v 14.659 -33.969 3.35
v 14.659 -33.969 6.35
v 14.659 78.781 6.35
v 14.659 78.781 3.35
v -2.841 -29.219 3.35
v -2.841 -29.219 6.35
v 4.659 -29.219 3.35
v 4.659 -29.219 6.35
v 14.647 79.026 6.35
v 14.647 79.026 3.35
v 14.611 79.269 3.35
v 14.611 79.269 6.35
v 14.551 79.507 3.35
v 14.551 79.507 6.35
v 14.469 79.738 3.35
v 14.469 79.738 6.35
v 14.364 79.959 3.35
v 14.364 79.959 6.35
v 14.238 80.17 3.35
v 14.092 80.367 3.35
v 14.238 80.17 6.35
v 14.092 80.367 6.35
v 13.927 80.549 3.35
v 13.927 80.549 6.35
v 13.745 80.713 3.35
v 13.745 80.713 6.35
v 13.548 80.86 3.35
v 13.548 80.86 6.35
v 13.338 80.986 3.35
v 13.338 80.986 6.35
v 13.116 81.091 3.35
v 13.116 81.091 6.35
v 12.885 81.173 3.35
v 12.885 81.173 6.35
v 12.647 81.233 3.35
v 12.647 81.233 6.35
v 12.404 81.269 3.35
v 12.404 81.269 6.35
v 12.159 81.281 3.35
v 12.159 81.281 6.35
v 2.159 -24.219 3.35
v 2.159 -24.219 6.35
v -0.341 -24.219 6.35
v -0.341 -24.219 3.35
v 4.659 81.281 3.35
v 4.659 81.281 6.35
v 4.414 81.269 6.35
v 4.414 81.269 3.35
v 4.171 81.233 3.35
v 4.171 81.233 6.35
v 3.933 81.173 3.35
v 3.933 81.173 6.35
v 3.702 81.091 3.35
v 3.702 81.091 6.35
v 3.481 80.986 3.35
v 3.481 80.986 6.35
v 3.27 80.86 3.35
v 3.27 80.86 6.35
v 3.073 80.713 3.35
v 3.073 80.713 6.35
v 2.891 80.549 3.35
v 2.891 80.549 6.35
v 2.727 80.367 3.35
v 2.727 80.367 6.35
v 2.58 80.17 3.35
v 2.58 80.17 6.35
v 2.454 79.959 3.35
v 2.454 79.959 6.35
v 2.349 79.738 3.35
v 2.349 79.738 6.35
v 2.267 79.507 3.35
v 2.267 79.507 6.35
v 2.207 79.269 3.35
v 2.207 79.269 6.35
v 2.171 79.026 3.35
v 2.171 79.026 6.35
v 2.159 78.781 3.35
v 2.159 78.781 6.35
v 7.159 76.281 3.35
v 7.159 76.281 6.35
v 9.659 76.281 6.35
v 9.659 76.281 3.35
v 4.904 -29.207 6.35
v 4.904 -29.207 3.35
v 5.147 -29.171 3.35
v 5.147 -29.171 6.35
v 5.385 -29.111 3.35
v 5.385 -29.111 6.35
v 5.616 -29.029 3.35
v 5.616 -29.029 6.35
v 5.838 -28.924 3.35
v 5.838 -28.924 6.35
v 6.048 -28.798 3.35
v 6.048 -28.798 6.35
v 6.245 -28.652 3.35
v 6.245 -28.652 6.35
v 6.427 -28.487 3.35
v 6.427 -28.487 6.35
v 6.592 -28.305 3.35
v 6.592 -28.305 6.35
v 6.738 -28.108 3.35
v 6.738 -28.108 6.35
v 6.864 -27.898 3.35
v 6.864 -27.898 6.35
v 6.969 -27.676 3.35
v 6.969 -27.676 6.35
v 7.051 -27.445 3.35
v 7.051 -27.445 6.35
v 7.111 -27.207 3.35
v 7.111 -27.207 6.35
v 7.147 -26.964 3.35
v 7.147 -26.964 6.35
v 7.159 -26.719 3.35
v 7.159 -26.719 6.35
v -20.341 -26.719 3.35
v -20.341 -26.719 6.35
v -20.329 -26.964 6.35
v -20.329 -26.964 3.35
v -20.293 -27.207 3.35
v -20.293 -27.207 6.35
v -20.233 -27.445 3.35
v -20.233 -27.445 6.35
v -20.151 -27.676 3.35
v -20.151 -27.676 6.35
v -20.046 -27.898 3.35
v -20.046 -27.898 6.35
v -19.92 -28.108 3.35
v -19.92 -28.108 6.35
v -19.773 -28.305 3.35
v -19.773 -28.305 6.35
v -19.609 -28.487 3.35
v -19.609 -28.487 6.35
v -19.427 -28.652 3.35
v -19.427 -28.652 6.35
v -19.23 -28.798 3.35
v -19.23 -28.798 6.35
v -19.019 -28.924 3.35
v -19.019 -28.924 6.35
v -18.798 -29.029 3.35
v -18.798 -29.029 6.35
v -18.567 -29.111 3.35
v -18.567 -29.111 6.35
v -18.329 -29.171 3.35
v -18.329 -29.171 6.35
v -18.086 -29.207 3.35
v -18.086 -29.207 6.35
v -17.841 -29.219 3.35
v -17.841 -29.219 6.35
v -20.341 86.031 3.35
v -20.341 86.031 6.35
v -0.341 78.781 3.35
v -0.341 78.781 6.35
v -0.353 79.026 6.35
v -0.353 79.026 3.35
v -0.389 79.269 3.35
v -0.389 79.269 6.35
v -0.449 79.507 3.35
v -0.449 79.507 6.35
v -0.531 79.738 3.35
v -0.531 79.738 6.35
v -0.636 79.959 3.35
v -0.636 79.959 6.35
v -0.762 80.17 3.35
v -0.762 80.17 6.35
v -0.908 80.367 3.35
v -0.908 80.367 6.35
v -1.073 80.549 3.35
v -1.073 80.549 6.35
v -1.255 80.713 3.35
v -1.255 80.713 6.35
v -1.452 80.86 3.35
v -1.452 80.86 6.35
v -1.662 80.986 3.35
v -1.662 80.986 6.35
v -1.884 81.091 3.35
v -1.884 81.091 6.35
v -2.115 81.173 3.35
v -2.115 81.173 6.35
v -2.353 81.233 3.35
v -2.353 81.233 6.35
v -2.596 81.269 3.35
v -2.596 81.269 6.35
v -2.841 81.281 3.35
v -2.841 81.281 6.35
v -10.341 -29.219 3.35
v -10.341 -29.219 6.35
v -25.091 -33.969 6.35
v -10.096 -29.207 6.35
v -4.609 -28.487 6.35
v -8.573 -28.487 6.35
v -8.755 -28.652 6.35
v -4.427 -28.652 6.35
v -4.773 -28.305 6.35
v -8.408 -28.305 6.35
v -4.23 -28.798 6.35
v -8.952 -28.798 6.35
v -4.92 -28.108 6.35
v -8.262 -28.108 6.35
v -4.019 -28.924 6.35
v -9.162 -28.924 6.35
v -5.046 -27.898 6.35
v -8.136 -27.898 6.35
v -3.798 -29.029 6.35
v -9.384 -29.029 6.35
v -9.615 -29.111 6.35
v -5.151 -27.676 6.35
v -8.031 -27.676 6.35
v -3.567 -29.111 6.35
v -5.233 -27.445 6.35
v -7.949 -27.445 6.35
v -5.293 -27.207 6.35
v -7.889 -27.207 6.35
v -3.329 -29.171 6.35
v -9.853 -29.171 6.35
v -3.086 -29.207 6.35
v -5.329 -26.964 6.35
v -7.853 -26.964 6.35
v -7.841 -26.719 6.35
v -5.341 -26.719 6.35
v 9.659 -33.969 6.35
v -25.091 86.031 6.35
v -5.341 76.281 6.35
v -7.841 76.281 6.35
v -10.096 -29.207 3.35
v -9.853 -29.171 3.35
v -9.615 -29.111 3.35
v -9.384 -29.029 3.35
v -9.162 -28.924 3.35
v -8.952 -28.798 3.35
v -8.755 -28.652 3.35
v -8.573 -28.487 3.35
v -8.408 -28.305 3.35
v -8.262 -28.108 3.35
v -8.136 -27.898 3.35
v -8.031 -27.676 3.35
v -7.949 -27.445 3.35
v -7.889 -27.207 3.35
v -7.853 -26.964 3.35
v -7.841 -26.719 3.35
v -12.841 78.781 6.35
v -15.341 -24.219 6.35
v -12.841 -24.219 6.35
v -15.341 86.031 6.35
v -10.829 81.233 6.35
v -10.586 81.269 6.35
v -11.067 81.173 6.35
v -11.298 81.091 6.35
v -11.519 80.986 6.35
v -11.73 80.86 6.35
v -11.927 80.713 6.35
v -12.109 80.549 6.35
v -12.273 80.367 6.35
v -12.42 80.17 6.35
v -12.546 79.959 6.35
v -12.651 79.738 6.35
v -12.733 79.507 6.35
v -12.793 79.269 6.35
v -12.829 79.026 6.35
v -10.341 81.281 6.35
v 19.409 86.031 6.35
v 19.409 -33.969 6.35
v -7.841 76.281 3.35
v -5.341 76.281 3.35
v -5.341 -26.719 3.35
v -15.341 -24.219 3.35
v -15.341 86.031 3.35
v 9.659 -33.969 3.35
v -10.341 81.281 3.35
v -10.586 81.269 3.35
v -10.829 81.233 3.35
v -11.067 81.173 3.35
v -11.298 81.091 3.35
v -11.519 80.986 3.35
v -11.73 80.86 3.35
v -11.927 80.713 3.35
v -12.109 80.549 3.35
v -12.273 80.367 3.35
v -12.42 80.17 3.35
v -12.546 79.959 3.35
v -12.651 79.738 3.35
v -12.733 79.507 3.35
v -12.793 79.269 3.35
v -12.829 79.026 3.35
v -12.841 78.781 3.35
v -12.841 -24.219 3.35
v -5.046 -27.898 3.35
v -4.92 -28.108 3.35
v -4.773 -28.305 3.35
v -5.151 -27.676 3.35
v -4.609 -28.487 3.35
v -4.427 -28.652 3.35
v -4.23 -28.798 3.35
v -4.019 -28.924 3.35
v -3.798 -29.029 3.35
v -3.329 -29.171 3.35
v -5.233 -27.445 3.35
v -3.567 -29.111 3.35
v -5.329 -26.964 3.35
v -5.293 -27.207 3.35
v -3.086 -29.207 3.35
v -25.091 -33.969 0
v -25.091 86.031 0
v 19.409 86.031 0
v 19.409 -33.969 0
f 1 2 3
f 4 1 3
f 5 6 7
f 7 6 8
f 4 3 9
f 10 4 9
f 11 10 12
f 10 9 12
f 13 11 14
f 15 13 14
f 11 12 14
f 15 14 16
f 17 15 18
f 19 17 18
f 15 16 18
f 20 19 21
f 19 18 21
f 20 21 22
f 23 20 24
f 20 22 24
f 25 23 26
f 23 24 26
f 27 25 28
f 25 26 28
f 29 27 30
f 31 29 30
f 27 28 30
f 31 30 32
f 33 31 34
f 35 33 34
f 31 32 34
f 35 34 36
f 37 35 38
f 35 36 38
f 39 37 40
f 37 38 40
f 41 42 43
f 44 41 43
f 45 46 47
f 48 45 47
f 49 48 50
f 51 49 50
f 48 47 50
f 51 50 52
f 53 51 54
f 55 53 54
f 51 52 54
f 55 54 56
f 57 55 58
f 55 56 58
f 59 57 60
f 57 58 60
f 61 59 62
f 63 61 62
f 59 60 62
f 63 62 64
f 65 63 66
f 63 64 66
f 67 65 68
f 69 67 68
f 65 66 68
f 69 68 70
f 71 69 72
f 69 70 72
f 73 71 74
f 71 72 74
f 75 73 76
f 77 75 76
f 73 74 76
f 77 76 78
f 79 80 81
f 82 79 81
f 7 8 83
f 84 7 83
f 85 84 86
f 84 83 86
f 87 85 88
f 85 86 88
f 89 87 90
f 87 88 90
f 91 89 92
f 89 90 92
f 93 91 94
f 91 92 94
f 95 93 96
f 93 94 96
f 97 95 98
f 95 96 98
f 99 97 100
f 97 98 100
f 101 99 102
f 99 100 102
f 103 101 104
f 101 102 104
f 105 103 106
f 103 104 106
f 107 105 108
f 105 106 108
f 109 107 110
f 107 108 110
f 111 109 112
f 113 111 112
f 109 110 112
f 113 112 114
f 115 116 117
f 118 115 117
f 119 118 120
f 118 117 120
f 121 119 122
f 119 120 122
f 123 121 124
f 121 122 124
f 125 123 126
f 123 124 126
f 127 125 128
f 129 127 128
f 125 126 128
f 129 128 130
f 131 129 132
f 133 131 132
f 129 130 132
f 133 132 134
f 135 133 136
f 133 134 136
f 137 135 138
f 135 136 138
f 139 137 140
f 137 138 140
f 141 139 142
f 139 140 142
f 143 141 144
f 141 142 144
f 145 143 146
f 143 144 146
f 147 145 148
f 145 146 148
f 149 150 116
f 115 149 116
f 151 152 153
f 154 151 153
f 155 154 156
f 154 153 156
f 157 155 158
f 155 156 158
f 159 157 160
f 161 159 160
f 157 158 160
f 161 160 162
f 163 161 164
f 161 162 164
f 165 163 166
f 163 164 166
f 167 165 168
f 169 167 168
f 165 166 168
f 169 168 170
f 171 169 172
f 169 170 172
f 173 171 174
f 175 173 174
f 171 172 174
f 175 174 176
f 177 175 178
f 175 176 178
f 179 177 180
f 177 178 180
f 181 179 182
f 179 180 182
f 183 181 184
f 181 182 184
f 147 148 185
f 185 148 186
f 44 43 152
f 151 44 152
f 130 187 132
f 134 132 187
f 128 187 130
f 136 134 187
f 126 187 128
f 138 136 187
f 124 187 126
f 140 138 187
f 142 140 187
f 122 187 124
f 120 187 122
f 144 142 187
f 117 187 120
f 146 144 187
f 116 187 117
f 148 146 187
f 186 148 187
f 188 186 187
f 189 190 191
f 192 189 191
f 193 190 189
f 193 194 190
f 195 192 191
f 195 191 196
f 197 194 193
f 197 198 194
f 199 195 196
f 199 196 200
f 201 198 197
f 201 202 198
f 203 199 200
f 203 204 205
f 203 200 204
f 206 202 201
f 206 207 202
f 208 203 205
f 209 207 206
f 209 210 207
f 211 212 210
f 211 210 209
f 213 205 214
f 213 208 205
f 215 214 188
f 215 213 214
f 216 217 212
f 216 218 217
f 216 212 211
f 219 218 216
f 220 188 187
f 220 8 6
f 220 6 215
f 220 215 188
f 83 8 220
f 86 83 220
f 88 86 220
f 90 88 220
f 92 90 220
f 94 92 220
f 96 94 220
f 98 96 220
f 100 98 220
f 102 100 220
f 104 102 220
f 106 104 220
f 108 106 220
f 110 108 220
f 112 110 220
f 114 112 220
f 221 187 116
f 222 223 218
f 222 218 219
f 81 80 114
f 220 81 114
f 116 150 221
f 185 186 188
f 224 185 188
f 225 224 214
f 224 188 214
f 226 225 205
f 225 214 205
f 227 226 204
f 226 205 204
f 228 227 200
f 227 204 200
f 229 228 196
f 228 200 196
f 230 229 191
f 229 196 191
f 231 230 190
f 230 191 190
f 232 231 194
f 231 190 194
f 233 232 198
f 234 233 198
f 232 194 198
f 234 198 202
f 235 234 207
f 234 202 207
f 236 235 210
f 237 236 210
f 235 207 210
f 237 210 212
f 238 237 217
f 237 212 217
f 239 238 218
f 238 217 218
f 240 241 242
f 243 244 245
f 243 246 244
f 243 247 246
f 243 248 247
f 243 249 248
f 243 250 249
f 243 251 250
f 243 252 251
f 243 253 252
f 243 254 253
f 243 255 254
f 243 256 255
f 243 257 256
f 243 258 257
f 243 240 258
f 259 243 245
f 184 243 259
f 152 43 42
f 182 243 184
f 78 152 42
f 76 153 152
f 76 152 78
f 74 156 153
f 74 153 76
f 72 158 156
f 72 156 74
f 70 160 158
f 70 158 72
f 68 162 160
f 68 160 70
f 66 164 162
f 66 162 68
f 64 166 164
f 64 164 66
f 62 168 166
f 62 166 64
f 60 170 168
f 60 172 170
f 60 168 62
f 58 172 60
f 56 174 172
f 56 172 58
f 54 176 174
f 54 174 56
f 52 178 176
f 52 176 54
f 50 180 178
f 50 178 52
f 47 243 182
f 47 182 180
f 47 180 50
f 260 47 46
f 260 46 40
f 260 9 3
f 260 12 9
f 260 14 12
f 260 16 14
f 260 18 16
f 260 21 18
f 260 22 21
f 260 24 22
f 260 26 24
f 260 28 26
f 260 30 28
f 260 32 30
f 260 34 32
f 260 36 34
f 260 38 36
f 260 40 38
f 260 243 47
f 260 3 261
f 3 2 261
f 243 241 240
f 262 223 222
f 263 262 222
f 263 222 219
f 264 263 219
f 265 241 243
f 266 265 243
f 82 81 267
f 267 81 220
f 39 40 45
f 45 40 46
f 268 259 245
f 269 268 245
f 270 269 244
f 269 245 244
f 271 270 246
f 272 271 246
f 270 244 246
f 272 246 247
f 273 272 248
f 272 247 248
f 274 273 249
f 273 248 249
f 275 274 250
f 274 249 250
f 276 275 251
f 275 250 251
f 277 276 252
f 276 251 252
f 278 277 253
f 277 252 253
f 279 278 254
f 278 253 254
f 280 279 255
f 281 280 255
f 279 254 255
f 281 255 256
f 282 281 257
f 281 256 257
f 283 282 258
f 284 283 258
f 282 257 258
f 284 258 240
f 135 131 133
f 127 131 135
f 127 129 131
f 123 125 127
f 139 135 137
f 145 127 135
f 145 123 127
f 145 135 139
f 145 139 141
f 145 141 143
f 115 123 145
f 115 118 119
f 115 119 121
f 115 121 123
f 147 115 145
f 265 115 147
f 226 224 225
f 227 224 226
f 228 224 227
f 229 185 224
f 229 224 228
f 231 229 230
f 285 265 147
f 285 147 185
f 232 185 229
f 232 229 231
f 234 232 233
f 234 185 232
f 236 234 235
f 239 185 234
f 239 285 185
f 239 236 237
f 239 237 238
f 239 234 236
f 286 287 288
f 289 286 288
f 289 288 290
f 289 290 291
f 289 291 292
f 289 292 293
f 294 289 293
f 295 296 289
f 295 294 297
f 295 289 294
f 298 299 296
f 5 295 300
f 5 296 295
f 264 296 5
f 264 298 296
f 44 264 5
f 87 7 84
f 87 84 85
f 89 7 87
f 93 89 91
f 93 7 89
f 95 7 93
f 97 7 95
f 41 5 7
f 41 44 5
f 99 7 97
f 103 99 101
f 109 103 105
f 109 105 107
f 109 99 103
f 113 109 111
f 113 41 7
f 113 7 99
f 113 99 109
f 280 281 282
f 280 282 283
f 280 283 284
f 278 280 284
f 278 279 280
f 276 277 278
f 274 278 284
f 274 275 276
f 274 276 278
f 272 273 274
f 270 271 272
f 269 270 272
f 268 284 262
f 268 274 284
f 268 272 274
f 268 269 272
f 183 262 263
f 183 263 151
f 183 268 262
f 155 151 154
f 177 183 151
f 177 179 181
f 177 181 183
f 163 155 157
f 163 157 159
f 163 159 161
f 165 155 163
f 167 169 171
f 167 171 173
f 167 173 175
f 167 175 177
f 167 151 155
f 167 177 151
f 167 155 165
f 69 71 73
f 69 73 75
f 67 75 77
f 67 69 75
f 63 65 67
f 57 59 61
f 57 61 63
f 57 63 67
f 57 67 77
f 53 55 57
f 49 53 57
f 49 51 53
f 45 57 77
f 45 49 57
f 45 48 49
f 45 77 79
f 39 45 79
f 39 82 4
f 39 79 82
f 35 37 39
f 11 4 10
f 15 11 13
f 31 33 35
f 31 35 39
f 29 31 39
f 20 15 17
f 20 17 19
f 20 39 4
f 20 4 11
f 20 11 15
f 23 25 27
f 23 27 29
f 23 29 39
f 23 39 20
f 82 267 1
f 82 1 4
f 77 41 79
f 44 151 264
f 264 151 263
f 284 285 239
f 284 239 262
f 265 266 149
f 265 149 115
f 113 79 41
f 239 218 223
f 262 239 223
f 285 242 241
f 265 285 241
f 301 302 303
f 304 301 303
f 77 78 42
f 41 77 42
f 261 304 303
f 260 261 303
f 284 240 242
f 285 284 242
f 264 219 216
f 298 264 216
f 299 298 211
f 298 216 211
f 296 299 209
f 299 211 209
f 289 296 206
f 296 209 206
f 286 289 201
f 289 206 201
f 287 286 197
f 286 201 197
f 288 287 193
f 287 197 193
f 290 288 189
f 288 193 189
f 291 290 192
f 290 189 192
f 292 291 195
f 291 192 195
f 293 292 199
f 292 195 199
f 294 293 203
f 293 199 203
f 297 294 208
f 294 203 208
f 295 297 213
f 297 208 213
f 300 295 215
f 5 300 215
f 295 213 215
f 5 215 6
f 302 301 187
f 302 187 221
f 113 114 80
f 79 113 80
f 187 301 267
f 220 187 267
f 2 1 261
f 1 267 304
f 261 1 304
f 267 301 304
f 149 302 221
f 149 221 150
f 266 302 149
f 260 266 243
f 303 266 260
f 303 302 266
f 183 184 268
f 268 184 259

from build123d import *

# Parameters (mm, degrees)
F0_W     = 44.5
F0_H     = 120
F1_DEPTH = 6.35
F3_DEPTH = 3


with BuildPart() as f1:
    # F0 (on Top) → F1 (new body)
    with BuildSketch(Plane.XY):
        with Locations((-2.840908, 26.030913)):
            Rectangle(F0_W, F0_H)
    extrude(amount=F1_DEPTH)

    # F2 (on face) → F3 (cut)
    with BuildSketch(Plane.XY.offset(6.35)):
        with BuildLine():
            Line((9.659092, 76.280913), (9.659092, -33.969087))
            Line((9.659092, -33.969087), (14.659092, -33.969087))
            Line((14.659092, -33.969087), (14.659092, 76.280913))
            Line((14.659092, 76.280913), (14.659092, 78.780913))
            ThreePointArc((14.659092, 78.780913), (13.926859, 80.548679), (12.159092, 81.280913))
            Line((12.159092, 81.280913), (4.659092, 81.280913))
            ThreePointArc((4.659092, 81.280913), (2.891325, 80.548679), (2.159092, 78.780913))
            Line((2.159092, 78.780913), (2.159092, -24.219087))
            Line((2.159092, -24.219087), (-0.340908, -24.219087))
            Line((-0.340908, -24.219087), (-0.340908, 78.780913))
            ThreePointArc((-0.340908, 78.780913), (-1.073141, 80.548679), (-2.840908, 81.280913))
            Line((-2.840908, 81.280913), (-10.340908, 81.280913))
            ThreePointArc((-10.340908, 81.280913), (-12.108675, 80.548679), (-12.840908, 78.780913))
            Line((-12.840908, 78.780913), (-12.840908, -24.219087))
            Line((-12.840908, -24.219087), (-15.340908, -24.219087))
            Line((-15.340908, -24.219087), (-15.340908, 86.030913))
            Line((-15.340908, 86.030913), (-20.340908, 86.030913))
            Line((-20.340908, 86.030913), (-20.340908, -26.719087))
            ThreePointArc((-20.340908, -26.719087), (-19.608675, -28.486854), (-17.840908, -29.219087))
            Line((-17.840908, -29.219087), (-10.340908, -29.219087))
            ThreePointArc((-10.340908, -29.219087), (-8.573141, -28.486854), (-7.840908, -26.719087))
            Line((-7.840908, -26.719087), (-7.840908, 76.280913))
            Line((-7.840908, 76.280913), (-5.340908, 76.280913))
            Line((-5.340908, 76.280913), (-5.340908, -26.719087))
            ThreePointArc((-5.340908, -26.719087), (-4.608675, -28.486854), (-2.840908, -29.219087))
            Line((-2.840908, -29.219087), (4.659092, -29.219087))
            ThreePointArc((4.659092, -29.219087), (6.426859, -28.486854), (7.159092, -26.719087))
            Line((7.159092, -26.719087), (7.159092, 76.280913))
            Line((7.159092, 76.280913), (9.659092, 76.280913))
        make_face()
    extrude(amount=-F3_DEPTH, mode=Mode.SUBTRACT)


solid = f1.part
